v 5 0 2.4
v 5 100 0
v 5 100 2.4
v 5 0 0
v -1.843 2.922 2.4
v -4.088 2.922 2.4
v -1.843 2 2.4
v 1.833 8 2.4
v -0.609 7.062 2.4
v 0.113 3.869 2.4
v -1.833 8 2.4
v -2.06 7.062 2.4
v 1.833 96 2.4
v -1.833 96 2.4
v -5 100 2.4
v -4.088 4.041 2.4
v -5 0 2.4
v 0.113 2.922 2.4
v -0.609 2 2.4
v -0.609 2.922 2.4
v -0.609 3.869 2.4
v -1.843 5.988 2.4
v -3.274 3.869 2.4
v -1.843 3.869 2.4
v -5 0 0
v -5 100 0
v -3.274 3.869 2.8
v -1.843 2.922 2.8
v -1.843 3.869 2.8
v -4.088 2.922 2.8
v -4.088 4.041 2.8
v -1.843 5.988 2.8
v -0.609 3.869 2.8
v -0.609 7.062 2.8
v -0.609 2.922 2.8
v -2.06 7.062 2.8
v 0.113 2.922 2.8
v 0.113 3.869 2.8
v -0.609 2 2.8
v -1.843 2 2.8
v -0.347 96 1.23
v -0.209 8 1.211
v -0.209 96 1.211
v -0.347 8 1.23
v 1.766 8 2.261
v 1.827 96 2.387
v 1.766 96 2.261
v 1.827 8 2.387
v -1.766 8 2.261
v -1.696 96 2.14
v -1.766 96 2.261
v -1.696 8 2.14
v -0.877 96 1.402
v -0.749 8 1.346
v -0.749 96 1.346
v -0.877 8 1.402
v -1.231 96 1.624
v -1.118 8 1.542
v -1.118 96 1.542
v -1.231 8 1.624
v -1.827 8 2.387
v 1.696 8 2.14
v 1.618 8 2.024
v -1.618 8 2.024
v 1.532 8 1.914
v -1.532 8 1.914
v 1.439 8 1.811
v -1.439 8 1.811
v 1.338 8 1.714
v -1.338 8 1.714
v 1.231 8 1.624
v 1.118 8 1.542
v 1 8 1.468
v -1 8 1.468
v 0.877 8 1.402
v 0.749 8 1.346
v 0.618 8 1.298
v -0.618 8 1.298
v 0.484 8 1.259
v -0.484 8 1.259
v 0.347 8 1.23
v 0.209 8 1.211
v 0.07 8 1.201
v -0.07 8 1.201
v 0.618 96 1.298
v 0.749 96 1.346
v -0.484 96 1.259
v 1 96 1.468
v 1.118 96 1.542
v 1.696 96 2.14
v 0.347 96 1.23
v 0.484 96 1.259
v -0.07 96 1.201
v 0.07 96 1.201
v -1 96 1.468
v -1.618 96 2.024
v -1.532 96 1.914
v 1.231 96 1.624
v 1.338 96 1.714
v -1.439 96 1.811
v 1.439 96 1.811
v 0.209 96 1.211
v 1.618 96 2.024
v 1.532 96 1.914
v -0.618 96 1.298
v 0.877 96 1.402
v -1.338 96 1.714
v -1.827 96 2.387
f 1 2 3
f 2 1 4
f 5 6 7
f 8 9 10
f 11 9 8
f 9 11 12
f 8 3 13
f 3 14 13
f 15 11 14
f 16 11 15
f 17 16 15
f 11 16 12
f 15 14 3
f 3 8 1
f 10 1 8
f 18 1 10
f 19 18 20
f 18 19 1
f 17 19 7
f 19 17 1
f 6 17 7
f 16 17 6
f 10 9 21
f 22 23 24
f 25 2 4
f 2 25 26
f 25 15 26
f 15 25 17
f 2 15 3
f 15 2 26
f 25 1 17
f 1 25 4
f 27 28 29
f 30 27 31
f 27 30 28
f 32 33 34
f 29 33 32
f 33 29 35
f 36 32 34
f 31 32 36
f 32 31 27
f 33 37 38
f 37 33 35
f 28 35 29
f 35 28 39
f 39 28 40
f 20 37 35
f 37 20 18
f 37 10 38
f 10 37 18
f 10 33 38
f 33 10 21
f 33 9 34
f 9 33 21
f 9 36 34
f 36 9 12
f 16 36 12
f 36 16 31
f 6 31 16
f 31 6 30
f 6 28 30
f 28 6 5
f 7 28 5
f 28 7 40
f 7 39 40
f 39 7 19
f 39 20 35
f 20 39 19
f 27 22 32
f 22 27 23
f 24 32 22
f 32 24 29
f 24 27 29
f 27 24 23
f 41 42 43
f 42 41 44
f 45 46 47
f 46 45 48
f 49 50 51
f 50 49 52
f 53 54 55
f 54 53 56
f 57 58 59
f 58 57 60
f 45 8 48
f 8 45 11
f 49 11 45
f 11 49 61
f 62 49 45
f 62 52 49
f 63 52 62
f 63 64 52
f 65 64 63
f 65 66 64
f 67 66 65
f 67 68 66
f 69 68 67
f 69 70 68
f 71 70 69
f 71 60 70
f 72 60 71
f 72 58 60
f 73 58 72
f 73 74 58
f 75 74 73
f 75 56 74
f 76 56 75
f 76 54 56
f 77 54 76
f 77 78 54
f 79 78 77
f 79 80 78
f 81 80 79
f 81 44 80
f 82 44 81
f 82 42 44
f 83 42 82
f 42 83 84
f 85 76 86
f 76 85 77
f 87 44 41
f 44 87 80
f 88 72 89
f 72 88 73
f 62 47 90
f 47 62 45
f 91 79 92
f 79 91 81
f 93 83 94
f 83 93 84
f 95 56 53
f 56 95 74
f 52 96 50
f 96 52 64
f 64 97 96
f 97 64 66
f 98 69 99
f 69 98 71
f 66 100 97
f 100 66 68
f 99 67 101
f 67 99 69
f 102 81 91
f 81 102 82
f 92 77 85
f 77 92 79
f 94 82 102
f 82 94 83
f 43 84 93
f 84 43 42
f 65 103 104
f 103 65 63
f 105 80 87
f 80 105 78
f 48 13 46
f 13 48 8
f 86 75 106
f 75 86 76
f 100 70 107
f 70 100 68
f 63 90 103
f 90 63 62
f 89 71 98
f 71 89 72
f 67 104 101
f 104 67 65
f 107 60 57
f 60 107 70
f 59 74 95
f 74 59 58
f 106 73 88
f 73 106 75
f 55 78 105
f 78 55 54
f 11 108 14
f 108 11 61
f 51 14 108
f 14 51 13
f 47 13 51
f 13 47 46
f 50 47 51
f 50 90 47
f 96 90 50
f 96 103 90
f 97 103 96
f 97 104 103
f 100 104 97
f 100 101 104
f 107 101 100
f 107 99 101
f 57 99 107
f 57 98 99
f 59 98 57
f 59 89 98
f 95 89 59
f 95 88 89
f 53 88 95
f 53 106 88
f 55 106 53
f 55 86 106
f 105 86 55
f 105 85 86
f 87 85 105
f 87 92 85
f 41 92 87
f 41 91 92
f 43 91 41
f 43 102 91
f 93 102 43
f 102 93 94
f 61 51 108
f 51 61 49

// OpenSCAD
/*
    Drill bit storage
*/

$fn=90;  // accuracy


// Constants (Don't change)
storageLenght = 100; // Not Bit lenght
maxBitLenght  = 88;  // Check bit lenght
storageWidth  = 10;  // Minimum width

// Bit dependent
bitDiameter = 4.0;

// Automatic  (Don't change)
diameterText      = str(bitDiameter);
storageHight      = bitDiameter*0.6; 
bitRadius         = bitDiameter/2;
bitPositionHeight = storageHight+bitDiameter*0.2; 



// Delition for crating drill track
difference() {

// Union for text and storage
union(){

// Storage 
translate([
    -storageWidth/2,    // Centering
    0, 
    0
    ]) 
cube(size = [
    storageWidth,
    storageLenght,
    storageHight
    ]);

// Milimiter dimension text
translate([
    -4.4,               // Fine deling x-axis
    2,                  // Fine deling y-axis 
    storageHight         
    ])
linear_extrude(height=0.4)text(
    diameterText,  // Dynamic text
    size=5,
    font="tohoma:style=bold",
    spacing=0.9
    );
    
// End of union    
}  

// Begining of Delition
// Drill tracl
rotate([90,0,0])
translate([
    0,                   // x-axis
    bitPositionHeight,   // Z-axis
    -(maxBitLenght+8)    // y-axis
    ])  
cylinder(
    h = maxBitLenght,    // y-axis
    r = bitRadius        // x-axis 
    );      

// End of Delition
}
